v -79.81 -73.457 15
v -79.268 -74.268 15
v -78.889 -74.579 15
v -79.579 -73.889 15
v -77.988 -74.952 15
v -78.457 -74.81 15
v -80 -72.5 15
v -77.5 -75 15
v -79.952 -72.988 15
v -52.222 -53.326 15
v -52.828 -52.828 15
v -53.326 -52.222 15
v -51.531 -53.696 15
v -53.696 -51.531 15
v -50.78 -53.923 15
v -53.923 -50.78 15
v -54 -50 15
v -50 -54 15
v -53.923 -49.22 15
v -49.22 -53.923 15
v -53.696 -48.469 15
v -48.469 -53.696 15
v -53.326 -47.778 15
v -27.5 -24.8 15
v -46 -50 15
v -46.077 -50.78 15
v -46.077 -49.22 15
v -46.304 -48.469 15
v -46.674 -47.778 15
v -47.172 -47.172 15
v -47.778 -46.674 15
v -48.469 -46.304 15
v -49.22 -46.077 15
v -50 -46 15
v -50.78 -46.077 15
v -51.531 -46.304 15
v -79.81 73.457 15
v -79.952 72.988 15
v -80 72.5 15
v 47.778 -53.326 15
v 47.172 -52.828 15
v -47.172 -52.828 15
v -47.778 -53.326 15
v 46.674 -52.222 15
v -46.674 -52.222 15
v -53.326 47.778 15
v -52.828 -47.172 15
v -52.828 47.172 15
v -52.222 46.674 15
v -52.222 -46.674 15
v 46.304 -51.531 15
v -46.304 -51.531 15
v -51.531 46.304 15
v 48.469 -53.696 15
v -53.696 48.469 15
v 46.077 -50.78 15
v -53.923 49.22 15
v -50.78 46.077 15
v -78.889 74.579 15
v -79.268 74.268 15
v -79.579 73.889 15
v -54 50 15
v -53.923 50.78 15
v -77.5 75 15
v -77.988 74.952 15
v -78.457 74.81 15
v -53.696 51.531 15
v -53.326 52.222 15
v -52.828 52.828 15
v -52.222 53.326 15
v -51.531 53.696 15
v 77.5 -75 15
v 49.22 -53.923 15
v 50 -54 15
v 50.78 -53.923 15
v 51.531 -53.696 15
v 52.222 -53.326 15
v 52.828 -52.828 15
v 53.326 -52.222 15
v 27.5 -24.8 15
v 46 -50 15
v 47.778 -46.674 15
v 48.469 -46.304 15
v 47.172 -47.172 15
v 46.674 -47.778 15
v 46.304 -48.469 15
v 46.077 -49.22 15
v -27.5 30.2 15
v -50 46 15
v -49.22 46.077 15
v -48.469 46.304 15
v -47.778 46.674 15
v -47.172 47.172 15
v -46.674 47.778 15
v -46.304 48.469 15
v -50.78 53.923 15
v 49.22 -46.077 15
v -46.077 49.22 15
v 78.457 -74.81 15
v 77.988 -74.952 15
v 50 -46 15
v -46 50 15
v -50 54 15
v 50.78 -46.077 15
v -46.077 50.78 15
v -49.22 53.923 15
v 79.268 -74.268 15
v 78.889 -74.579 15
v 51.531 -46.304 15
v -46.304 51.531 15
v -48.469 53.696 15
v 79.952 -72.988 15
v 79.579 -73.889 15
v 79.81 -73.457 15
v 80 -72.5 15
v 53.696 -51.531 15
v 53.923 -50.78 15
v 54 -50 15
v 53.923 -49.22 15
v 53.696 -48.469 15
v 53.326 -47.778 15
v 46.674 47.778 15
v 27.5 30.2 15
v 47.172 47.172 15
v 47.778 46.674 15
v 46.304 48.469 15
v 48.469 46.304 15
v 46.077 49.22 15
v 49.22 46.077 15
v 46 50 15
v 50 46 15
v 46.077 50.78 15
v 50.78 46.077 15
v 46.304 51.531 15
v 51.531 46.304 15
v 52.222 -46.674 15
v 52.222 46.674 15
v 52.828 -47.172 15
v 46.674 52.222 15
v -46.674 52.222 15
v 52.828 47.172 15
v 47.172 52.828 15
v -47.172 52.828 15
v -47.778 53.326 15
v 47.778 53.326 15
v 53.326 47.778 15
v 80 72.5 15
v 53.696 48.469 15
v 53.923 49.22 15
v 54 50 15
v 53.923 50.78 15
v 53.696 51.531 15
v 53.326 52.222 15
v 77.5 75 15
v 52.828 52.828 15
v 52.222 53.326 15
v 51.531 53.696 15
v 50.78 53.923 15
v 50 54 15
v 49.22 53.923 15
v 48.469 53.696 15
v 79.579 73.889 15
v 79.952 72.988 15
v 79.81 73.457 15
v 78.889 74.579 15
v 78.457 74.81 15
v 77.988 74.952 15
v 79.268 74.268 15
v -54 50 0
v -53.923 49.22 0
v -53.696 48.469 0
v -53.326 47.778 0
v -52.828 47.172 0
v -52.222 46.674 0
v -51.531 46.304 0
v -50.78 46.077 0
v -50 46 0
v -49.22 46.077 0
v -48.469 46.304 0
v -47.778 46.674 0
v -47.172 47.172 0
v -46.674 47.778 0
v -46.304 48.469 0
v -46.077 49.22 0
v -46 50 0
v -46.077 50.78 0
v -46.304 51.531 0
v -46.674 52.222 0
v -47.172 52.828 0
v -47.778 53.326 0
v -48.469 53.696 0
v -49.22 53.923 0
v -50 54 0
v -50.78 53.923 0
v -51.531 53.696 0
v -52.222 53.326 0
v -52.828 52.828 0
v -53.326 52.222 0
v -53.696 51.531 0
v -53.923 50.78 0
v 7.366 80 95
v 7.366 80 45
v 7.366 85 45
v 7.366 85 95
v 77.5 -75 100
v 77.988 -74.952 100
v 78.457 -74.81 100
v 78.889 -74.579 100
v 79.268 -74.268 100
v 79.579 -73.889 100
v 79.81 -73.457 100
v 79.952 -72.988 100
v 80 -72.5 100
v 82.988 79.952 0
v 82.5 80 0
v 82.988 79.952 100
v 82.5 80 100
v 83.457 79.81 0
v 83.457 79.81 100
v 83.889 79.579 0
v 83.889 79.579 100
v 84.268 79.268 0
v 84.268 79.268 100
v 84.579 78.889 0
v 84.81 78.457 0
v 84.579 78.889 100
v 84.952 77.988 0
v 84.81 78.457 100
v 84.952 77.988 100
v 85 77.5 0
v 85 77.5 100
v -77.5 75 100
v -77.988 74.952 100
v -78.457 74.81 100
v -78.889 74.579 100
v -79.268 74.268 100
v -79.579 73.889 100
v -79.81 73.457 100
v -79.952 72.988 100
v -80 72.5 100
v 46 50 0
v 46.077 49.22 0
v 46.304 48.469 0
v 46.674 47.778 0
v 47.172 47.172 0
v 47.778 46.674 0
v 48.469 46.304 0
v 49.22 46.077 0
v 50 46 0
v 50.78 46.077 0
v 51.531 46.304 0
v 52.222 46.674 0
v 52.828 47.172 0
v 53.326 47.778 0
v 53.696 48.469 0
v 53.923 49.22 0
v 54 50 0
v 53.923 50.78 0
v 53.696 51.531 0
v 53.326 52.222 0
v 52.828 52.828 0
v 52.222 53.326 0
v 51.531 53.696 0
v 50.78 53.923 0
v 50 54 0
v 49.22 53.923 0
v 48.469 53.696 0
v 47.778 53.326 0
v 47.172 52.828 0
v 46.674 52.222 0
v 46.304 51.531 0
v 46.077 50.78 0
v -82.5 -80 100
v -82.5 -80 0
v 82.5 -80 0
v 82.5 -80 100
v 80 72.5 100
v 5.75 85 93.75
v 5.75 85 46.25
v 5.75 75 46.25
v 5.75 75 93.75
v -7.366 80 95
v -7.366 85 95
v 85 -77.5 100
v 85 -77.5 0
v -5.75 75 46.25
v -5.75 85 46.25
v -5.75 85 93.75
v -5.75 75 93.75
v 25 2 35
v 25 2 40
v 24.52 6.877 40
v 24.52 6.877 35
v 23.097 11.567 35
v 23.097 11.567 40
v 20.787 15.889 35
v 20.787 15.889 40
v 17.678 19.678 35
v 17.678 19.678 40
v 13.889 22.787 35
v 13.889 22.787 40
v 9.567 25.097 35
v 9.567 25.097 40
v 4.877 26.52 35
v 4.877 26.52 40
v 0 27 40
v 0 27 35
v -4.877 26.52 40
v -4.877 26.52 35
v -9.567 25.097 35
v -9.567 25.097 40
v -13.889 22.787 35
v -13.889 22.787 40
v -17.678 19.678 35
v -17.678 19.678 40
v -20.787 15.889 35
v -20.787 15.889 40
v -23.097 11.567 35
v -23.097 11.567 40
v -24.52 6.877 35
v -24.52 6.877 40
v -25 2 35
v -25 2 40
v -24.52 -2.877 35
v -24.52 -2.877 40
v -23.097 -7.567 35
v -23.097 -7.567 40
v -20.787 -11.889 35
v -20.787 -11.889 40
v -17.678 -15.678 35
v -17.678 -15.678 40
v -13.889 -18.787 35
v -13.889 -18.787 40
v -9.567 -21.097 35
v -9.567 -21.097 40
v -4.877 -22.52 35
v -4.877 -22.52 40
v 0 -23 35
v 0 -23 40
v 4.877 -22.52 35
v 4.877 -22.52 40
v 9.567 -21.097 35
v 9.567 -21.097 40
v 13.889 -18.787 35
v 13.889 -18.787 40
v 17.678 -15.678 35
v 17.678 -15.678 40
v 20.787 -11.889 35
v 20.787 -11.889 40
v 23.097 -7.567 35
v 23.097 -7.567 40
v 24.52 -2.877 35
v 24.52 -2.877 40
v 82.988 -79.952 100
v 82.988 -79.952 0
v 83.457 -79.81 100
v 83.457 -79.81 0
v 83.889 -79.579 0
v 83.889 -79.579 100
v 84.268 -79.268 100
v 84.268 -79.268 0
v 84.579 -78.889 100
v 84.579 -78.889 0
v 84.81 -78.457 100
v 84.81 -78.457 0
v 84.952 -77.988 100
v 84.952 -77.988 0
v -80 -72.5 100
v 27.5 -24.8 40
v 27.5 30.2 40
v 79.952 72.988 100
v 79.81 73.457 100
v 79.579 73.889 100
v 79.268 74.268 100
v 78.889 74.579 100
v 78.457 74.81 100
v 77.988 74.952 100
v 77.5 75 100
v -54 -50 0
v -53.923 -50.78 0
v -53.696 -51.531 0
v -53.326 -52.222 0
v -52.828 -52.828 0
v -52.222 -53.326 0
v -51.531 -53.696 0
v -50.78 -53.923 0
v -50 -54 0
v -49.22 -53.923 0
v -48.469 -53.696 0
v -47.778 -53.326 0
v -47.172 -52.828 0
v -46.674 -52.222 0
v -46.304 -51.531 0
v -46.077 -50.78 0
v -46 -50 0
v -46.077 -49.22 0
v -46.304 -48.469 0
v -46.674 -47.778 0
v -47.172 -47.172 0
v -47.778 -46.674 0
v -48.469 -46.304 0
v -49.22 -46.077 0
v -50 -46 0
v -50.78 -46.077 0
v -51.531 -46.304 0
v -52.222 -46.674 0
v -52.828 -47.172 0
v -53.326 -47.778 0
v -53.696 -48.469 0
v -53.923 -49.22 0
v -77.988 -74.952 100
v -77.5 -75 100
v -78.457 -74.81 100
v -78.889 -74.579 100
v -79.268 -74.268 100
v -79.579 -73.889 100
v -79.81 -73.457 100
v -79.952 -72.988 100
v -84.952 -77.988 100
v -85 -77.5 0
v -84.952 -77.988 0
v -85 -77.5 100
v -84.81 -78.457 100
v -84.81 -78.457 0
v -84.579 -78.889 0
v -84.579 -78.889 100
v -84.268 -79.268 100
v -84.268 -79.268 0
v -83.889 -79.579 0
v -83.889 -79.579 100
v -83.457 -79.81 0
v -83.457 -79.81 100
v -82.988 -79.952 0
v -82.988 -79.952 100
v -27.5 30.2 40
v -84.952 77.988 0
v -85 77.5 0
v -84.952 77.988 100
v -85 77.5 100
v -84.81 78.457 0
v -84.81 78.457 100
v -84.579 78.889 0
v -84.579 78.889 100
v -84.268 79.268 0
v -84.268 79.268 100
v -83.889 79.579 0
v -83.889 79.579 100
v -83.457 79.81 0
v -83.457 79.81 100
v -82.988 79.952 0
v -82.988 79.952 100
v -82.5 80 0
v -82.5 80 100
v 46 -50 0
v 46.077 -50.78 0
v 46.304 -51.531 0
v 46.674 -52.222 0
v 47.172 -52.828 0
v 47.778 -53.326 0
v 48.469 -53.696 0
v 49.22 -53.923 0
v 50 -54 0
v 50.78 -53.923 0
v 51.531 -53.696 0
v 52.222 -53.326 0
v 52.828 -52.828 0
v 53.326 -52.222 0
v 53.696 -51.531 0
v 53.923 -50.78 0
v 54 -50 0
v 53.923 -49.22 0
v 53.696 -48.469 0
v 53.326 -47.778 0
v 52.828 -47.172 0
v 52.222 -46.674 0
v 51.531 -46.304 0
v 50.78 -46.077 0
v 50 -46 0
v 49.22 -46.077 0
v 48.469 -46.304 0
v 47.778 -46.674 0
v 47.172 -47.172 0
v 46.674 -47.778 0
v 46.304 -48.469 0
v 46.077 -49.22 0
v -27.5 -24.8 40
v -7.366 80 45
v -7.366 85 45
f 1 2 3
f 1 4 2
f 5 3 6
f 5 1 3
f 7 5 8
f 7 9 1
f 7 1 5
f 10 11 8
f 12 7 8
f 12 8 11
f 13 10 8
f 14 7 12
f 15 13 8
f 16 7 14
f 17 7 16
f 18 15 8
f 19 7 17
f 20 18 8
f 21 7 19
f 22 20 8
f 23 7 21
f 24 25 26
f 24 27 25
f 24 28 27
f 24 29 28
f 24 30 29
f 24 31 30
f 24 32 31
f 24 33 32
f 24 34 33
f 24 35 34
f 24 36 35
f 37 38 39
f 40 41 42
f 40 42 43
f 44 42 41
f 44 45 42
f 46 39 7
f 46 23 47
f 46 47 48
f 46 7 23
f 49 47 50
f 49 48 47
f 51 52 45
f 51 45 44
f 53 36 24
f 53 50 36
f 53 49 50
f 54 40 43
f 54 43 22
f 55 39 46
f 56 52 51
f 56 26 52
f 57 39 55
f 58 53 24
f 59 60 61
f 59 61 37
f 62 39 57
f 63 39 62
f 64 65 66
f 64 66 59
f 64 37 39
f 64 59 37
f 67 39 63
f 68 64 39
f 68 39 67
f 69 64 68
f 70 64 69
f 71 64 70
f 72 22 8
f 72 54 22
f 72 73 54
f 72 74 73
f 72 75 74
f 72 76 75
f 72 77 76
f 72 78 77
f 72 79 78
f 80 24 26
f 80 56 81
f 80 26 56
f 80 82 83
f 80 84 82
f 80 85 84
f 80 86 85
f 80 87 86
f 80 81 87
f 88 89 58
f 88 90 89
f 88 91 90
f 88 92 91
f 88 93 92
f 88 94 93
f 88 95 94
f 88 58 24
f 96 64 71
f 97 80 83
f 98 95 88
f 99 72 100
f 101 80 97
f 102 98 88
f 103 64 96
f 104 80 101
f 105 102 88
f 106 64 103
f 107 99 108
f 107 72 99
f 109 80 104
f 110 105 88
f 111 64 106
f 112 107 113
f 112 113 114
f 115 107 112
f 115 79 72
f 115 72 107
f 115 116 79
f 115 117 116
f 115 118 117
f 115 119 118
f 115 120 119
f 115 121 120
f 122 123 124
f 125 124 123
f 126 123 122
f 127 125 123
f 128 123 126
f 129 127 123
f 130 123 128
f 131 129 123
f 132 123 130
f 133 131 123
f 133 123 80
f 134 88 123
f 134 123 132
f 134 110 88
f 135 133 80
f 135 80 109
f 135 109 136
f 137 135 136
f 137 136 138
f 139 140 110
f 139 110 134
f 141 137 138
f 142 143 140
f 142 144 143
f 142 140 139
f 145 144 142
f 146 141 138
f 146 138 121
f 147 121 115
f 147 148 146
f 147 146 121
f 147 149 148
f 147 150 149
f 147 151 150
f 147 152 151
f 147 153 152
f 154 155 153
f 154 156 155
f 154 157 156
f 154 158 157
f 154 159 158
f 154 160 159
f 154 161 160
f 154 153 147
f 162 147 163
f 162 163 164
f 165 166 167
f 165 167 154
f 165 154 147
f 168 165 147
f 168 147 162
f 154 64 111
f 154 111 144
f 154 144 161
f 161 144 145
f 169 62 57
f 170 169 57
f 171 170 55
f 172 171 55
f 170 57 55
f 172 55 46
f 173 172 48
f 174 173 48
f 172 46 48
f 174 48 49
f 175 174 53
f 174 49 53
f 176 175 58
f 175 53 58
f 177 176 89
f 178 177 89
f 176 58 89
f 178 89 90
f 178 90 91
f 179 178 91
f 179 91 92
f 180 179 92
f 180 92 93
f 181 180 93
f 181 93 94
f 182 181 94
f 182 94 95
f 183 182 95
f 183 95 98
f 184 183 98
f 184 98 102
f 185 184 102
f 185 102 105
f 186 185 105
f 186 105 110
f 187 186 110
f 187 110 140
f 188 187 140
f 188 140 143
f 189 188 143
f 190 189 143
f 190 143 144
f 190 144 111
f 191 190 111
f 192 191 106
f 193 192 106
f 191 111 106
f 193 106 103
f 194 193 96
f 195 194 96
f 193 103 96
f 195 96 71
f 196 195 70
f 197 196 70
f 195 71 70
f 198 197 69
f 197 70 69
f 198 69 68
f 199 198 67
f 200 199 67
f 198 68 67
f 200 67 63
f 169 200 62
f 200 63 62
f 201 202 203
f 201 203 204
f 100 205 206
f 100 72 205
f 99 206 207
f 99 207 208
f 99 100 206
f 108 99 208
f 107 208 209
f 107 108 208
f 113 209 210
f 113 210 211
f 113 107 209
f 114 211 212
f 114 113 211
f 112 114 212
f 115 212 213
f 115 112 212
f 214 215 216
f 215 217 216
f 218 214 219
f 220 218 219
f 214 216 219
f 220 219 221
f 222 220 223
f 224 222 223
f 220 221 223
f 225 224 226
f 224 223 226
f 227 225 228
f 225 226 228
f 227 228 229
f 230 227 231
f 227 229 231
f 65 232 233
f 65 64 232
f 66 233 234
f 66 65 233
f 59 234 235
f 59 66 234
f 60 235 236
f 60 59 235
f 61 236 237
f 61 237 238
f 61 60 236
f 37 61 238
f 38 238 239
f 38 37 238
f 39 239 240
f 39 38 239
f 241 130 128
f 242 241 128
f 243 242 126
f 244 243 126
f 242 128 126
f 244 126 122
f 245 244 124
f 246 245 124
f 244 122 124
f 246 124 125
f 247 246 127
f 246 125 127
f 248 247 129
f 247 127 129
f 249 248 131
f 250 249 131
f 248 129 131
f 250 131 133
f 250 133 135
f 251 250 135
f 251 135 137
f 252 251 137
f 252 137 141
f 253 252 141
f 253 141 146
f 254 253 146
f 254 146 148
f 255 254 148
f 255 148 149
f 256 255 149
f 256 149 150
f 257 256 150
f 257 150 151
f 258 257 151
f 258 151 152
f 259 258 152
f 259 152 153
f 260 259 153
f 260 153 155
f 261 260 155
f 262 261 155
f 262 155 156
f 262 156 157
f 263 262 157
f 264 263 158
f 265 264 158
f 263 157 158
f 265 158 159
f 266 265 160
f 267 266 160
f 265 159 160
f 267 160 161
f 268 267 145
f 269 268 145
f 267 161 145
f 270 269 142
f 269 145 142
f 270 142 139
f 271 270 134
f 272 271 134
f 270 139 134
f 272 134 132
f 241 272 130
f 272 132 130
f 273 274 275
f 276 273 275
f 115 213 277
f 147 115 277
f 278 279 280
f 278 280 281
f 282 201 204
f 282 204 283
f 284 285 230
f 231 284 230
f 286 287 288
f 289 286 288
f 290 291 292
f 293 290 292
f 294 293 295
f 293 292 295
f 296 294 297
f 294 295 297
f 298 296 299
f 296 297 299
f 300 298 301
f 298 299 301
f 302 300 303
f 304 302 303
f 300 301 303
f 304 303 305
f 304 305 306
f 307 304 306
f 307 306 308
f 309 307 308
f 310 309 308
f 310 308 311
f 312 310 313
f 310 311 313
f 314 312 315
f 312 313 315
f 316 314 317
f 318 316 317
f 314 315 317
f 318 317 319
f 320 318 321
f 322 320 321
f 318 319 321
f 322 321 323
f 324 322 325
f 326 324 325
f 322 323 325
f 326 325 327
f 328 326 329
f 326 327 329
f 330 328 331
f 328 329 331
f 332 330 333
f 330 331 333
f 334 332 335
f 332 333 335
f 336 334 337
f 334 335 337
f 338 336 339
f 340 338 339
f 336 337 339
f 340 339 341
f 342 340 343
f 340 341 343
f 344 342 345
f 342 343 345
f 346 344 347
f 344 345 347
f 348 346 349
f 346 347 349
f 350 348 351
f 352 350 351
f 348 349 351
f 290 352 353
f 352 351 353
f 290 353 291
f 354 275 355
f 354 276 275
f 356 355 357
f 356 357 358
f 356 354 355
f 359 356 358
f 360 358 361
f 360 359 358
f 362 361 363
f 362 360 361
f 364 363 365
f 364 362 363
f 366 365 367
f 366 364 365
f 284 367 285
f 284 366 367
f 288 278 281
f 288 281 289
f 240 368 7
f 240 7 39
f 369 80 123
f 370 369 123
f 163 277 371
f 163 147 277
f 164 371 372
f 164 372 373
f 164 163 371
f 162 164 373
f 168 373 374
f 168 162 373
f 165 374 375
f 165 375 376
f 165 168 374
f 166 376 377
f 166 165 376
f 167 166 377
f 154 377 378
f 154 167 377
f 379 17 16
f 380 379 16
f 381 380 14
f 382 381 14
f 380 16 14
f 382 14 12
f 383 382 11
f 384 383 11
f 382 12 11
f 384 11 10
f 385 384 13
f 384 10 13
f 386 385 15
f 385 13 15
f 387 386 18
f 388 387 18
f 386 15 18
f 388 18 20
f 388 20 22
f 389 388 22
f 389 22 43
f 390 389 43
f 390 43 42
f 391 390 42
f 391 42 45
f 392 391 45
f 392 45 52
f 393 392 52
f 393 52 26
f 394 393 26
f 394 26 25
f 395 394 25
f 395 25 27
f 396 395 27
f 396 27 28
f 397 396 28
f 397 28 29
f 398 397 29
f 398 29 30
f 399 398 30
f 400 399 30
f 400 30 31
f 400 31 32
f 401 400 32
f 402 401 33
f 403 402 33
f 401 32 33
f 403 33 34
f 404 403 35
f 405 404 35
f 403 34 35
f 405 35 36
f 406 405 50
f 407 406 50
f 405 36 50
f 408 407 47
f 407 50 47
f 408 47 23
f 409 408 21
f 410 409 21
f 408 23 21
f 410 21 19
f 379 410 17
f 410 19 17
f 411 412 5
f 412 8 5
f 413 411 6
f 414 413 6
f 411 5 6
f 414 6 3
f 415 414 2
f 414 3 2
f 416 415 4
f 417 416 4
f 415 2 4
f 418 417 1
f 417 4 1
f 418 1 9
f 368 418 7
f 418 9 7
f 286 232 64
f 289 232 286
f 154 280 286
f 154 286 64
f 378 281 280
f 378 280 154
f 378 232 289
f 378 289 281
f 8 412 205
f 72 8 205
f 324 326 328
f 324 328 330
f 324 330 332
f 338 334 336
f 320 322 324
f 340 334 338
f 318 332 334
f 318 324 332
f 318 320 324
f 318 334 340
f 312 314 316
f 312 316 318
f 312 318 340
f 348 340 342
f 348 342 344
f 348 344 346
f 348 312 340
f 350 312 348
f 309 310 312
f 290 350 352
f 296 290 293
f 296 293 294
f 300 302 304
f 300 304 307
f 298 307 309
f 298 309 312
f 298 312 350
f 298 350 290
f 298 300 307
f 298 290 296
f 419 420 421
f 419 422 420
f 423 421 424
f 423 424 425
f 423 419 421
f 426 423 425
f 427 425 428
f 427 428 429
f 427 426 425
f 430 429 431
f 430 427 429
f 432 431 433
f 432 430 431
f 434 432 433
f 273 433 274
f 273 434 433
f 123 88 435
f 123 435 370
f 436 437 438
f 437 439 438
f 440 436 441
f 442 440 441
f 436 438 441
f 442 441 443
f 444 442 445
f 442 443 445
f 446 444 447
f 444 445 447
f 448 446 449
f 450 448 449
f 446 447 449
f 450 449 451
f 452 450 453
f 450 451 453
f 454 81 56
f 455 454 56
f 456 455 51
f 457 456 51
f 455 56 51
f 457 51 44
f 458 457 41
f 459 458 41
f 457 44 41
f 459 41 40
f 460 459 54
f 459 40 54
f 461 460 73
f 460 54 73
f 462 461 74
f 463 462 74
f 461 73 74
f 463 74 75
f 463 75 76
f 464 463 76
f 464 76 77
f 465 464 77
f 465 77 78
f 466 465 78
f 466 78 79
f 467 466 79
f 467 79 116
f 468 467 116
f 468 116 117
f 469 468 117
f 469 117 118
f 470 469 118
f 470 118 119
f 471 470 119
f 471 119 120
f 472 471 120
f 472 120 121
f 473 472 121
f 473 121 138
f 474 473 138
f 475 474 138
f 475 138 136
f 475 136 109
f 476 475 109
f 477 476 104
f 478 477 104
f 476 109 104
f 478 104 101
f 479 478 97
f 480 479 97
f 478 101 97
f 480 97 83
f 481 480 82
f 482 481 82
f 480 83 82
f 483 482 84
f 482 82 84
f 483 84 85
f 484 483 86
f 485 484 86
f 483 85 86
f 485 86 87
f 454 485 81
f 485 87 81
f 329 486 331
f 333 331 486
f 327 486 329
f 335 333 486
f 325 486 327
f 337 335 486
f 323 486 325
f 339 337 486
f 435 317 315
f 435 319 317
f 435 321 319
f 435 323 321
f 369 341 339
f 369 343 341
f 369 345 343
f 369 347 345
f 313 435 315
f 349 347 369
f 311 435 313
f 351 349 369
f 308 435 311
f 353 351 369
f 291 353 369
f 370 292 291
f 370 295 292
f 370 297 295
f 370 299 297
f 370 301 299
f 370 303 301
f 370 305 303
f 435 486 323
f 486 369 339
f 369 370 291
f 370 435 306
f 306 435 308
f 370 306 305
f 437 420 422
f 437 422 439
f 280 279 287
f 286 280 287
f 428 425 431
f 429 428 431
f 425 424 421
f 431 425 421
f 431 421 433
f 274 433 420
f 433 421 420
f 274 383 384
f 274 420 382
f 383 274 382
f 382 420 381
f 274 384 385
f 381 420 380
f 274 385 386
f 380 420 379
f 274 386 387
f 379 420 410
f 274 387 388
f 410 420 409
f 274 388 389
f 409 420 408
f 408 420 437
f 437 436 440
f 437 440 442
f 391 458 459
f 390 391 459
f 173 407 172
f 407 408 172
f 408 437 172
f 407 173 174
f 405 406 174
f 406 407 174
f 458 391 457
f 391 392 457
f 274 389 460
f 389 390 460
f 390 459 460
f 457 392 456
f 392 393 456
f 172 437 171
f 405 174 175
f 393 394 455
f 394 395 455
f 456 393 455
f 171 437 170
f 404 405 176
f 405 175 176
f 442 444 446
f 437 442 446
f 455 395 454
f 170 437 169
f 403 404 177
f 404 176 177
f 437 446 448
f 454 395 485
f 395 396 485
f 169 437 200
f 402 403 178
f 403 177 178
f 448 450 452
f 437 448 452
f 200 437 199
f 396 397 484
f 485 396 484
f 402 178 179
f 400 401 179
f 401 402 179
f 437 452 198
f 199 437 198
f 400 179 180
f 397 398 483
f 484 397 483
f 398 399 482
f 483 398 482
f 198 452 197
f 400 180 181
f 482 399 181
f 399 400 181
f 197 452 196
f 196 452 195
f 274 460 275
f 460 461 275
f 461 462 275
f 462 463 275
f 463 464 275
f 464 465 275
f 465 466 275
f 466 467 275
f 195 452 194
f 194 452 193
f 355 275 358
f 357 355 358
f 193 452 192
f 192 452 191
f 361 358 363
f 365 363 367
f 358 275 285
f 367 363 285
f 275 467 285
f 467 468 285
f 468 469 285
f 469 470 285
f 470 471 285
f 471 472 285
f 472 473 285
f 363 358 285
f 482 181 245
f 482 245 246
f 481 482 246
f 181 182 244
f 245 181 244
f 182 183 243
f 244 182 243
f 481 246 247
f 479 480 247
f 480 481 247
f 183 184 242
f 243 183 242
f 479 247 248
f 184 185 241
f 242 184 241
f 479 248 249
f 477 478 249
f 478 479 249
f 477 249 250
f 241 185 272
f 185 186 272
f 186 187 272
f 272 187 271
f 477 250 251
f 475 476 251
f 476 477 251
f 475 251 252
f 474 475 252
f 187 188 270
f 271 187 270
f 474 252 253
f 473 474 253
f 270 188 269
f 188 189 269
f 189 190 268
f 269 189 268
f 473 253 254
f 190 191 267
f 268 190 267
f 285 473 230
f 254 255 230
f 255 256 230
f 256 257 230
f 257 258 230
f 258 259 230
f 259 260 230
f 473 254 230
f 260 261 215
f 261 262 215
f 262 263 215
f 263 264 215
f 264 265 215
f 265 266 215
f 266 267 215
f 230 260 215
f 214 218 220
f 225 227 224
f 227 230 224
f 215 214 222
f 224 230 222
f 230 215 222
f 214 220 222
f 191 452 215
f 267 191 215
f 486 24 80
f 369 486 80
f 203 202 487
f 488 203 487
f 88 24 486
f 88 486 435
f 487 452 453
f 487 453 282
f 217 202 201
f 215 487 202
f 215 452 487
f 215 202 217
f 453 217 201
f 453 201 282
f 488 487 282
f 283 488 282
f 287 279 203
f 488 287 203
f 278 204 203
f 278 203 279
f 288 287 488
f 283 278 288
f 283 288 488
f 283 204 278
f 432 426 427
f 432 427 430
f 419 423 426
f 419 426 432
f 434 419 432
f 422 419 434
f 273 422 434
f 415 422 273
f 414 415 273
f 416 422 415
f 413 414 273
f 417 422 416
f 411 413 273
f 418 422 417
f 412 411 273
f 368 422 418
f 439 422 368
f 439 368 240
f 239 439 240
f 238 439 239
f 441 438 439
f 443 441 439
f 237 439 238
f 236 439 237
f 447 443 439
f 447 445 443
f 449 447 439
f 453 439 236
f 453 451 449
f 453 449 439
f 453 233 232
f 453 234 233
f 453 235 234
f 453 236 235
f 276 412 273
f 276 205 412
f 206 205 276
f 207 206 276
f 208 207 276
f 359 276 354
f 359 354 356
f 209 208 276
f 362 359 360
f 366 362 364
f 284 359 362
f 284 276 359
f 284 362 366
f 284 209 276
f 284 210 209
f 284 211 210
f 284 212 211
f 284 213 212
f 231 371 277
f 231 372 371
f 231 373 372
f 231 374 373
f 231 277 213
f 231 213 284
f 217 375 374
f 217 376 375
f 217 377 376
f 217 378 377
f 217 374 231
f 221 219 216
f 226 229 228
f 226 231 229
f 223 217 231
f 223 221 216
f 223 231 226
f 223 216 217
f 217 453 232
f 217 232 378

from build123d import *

# Parameters (mm, degrees)
F0_W      = 170
F0_H      = 160
F1_DEPTH  = 100
F2_W      = 160
F2_H      = 150
F3_DEPTH  = 85
F4_W      = 14.732
F4_H      = 50
F5_DEPTH  = 5
F6_W      = 11.5
F6_H      = 47.5
F7_DEPTH  = 10
F8_R      = 2.5
F9_W      = 55
F9_H      = 55
F10_DEPTH = 25
F11_R     = 25
F12_DEPTH = 5
F14_D     = 8


with BuildPart() as f1:
    # F0 (on Top) → F1 (new body)
    with BuildSketch(Plane.XY):
        Rectangle(F0_W, F0_H)
    extrude(amount=F1_DEPTH)

    # F2 (on face) → F3 (cut)
    with BuildSketch(Plane.XY.offset(100)):
        Rectangle(F2_W, F2_H)
    extrude(amount=-F3_DEPTH, mode=Mode.SUBTRACT)

    # F4 (on face) → F5 (join)
    with BuildSketch(Plane(origin=(0, 80, 0), x_dir=(-1, 0, 0), z_dir=(0, 1, 0))):
        with Locations((0, 70)):
            Rectangle(F4_W, F4_H)
    extrude(amount=F5_DEPTH)

    # F6 (on face) → F7 (cut, through all)
    with BuildSketch(Plane(origin=(0, 85, 0), x_dir=(-1, 0, 0), z_dir=(0, 1, 0))):
        with Locations((0, 70)):
            Rectangle(F6_W, F6_H)
    extrude(amount=-F7_DEPTH, mode=Mode.SUBTRACT)

    # F8
    f8_edges = [f1.edges().sort_by_distance(p)[0] for p in [
        (85, -80, 50),
        (-85, -80, 50),
        (85, 80, 50),
        (-85, 80, 50),
        (80, 75, 57.5),
        (-80, 75, 57.5),
        (-80, -75, 57.5),
        (80, -75, 57.5),
    ]]
    fillet(f8_edges, radius=F8_R)

    # F9 (on face) → F10 (join)
    with BuildSketch(Plane.XY.offset(15)):
        with Locations((0, 2.7)):
            Rectangle(F9_W, F9_H)
    extrude(amount=F10_DEPTH)

    # F11 (on face) → F12 (cut)
    with BuildSketch(Plane.XY.offset(40)):
        with Locations((0, 2)):
            Circle(F11_R)
    extrude(amount=-F12_DEPTH, mode=Mode.SUBTRACT)

    # F14 (through all)
    with Locations(Plane(origin=(0, 0, 0), x_dir=(1, 0, 0), z_dir=(0, 0, -1))):
        with Locations((-50, 50), (50, 50), (50, -50), (-50, -50)):
            Hole(F14_D / 2)


solid = f1.part
